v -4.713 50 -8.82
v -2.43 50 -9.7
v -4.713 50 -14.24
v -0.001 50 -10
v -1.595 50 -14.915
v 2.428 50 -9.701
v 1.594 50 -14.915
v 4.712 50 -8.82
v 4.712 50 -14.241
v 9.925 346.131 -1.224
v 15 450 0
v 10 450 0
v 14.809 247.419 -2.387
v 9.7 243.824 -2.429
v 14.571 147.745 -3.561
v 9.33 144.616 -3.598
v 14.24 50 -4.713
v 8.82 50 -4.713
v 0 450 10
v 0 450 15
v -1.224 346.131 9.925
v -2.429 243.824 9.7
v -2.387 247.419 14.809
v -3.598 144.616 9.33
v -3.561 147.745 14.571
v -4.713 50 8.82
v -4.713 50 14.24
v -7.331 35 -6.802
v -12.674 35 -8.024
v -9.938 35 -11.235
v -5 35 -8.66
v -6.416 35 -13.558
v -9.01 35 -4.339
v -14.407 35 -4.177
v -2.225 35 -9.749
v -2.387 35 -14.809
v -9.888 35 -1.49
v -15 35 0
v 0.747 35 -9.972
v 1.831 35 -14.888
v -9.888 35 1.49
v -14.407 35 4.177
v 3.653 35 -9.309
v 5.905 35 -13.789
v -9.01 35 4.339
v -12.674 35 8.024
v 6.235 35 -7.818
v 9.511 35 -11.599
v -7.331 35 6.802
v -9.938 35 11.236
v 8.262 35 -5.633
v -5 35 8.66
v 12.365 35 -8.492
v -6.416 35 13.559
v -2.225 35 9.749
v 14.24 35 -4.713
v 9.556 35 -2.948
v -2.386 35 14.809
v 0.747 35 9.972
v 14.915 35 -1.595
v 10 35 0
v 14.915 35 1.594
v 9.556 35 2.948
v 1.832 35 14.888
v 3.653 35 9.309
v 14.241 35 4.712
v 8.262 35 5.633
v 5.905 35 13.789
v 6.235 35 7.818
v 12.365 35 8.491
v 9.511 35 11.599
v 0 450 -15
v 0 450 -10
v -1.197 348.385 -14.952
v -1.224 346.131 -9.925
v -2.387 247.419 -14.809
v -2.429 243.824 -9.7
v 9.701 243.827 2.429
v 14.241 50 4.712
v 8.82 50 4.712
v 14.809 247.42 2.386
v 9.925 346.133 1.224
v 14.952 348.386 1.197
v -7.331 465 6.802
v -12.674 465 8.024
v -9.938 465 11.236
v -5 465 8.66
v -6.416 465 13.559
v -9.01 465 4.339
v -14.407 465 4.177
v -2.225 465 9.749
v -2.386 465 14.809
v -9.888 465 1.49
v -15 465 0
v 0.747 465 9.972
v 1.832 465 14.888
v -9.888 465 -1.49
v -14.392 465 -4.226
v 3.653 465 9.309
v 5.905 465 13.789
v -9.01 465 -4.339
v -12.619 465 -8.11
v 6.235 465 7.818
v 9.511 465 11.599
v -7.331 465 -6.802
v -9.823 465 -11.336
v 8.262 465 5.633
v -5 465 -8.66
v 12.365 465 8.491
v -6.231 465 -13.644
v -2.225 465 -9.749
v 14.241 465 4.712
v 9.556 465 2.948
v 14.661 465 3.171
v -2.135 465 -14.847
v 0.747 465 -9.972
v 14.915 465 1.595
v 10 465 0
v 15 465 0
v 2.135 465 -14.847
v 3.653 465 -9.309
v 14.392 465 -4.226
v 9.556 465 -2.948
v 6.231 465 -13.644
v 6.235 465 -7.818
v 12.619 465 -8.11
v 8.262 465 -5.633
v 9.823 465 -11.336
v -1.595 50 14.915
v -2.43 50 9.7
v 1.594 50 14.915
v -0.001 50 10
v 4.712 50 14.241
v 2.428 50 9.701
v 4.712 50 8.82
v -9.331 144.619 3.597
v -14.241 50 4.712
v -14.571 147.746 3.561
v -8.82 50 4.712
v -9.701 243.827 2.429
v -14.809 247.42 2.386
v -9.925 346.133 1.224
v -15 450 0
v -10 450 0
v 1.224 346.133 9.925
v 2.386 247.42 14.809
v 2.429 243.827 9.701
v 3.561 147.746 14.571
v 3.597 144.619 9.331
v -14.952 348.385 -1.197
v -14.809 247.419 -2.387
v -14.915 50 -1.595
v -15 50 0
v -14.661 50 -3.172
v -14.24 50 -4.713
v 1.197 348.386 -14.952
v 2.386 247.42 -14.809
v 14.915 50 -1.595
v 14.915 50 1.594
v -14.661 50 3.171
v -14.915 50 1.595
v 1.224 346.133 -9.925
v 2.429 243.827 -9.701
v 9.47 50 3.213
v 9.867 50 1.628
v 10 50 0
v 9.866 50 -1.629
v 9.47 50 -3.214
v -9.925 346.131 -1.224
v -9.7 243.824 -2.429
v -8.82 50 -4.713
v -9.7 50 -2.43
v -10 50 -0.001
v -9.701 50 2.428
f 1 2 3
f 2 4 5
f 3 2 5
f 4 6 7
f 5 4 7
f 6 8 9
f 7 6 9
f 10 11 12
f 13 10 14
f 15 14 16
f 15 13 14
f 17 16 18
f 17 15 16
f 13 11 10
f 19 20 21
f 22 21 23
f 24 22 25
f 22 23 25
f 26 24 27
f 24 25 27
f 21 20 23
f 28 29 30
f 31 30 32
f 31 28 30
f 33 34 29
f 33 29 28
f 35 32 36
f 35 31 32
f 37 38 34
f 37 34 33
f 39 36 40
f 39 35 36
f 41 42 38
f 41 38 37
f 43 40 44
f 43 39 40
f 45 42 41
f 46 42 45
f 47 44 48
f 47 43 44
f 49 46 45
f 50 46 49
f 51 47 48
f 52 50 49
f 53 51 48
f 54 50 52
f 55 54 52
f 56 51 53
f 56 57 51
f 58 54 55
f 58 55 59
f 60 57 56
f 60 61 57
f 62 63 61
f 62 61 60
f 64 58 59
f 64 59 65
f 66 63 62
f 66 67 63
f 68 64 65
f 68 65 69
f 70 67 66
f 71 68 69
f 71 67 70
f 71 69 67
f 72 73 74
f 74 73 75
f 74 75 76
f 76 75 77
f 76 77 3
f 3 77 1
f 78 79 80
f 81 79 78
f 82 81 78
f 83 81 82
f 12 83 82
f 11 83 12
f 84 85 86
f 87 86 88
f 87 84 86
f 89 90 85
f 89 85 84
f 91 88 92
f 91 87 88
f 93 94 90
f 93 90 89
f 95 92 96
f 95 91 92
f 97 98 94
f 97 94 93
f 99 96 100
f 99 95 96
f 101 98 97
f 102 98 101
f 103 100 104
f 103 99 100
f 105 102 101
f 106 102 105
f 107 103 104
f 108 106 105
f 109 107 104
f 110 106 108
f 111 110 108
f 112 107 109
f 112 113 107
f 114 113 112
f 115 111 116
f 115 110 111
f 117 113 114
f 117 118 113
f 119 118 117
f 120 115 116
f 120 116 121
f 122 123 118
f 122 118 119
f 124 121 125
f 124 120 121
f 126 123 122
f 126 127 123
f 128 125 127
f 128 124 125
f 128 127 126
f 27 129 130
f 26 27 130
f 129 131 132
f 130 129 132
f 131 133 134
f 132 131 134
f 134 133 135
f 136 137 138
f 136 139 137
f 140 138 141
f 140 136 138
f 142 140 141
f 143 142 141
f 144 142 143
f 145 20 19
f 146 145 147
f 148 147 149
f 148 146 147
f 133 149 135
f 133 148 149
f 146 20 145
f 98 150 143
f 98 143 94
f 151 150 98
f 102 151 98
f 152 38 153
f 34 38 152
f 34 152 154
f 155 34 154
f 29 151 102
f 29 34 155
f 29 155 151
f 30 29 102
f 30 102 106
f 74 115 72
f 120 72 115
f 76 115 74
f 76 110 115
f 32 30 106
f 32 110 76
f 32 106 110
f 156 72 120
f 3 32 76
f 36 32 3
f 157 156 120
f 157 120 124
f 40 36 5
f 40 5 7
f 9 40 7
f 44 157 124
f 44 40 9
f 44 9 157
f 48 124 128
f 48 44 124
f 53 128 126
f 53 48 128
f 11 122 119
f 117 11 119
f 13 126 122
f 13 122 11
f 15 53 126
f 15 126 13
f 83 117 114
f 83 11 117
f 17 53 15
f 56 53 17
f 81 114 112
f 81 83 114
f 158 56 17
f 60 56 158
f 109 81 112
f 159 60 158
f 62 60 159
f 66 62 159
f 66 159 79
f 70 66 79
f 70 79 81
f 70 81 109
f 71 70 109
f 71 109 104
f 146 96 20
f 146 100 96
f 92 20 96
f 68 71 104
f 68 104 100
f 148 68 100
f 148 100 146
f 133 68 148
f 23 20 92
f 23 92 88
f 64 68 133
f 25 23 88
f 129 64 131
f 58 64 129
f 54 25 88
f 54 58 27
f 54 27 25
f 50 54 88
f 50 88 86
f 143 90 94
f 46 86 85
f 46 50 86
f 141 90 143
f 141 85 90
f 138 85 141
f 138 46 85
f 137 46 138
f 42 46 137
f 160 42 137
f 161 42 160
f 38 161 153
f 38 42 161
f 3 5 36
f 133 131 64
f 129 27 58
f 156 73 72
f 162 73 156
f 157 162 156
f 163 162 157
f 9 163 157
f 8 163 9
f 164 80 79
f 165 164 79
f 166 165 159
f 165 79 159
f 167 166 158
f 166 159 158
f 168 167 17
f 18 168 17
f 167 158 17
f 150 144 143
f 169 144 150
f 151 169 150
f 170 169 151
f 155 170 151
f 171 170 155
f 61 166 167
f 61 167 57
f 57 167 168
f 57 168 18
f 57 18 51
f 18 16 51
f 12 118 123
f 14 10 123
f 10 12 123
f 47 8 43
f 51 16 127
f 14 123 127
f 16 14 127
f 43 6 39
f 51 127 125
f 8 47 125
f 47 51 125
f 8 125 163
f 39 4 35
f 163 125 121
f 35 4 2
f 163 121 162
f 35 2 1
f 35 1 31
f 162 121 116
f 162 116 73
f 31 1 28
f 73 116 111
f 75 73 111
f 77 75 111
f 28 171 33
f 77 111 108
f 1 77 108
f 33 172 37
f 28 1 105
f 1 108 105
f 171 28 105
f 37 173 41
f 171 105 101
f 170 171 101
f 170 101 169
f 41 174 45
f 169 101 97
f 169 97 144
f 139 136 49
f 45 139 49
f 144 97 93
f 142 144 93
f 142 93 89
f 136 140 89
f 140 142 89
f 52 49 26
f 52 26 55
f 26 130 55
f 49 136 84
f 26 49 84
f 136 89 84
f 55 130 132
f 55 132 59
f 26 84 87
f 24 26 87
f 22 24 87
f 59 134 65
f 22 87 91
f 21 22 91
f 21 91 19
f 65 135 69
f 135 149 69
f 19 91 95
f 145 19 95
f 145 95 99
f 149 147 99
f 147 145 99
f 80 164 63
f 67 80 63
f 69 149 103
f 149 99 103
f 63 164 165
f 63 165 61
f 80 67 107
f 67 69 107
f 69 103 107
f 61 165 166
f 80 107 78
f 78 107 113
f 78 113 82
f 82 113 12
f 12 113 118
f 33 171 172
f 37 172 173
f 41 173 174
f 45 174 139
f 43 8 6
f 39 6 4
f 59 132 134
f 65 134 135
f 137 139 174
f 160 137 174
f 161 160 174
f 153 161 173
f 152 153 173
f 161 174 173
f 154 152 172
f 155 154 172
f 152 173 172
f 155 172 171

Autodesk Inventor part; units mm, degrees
ref_plane "XZ Plane" through (0, 0, 0) normal (0, 1, 0) x (-1, 0, 0)
sketch "Sketch1" plane through (0, 0, 0) normal (0, 1, 0) x (-1, 0, 0)
  circle A0 centre (0, 0) radius 15
  dimension "d0" = 30
extrude "Extrusion1" add sketch "Sketch1" along normal blind 500
ref_plane "Work Plane1" through (15, 0, 0) normal (1, 0, 0) x (0, 1, 0)
sketch "Sketch2" plane through (15, 0, 0) normal (1, 0, 0) x (0, 1, 0)
  line L0 (50, 4.712) -> (50, -4.713)
  line L1 (450, 0) -> (50, -4.713)
  line L2 (50, 4.712) -> (450, 0)
  point P0 (0, 0)
  dimension "d4" = 9.425
extrude "Extrusion2" cut sketch "Sketch2" against normal blind 500
ref_plane "Work Plane2" through (0, 0, 15) normal (0, 0, 1) x (1, 0, 0)
sketch "Sketch3" plane through (0, 0, 15) normal (0, 0, 1) x (1, 0, 0)
  line L0 (4.712, 50) -> (-4.713, 50)
  line L1 (0, 450) -> (4.712, 50)
  line L2 (0, 450) -> (-4.713, 50)
  point P0 (0, 0)
  dimension "d8" = 9.425
extrude "Extrusion3" cut sketch "Sketch3" against normal blind 500
sketch "Sketch4" plane through (0, 500, 0) normal (0, 1, 0) x (1, 0, 0)
  circle A0 centre (0, 0) radius 10
  dimension "d11" = 20
extrude "Extrusion4" cut sketch "Sketch4" against normal blind 500
sketch "Sketch5" plane through (0, 500, 0) normal (0, 1, 0) x (1, 0, 0)
  circle A0 centre (0, 0) radius 15
extrude "Extrusion5" cut sketch "Sketch5" against normal blind 10
sketch "Sketch6" plane through (0, 0, 0) normal (0, -1, 0) x (1, 0, 0)
  circle A0 centre (0, 0) radius 15
extrude "Extrusion6" cut sketch "Sketch6" against normal blind 10
sketch "Sketch7" plane through (0, 0, 0) normal (0, 0, 1) x (1, 0, 0)
  point P0 (0, 0)
sketch "Sketch8" plane through (0, 10, 0) normal (0, -1, 0) x (1, 0, 0)
  circle A0 centre (0, 0) radius 15
extrude "Extrusion7" cut sketch "Sketch8" against normal blind 10
sketch "Sketch9" plane through (0, 490, 0) normal (0, 1, 0) x (1, 0, 0)
  circle A0 centre (0, 0) radius 10 projected
  circle A1 centre (0, 0) radius 15
extrude "Extrusion8" cut sketch "Sketch9" against normal blind 10
sketch "Sketch10" plane through (0, 20, 0) normal (0, -1, 0) x (1, 0, 0)
  arc A0 (14.2404, -4.713) -> (14.2407, 4.712) centre (0, 0) ccw projected
  circle A1 centre (0, 0) radius 15
extrude "Extrusion9" cut sketch "Sketch10" against normal blind 15
sketch "Sketch11" plane through (0, 480, 0) normal (0, 1, 0) x (1, 0, 0)
  arc A0 (14.2407, -4.712) -> (15, 0) centre (0, 0) ccw projected
  circle A1 centre (0, 0) radius 15
extrude "Extrusion10" cut sketch "Sketch11" against normal blind 15
properties part number "steam pipe"
